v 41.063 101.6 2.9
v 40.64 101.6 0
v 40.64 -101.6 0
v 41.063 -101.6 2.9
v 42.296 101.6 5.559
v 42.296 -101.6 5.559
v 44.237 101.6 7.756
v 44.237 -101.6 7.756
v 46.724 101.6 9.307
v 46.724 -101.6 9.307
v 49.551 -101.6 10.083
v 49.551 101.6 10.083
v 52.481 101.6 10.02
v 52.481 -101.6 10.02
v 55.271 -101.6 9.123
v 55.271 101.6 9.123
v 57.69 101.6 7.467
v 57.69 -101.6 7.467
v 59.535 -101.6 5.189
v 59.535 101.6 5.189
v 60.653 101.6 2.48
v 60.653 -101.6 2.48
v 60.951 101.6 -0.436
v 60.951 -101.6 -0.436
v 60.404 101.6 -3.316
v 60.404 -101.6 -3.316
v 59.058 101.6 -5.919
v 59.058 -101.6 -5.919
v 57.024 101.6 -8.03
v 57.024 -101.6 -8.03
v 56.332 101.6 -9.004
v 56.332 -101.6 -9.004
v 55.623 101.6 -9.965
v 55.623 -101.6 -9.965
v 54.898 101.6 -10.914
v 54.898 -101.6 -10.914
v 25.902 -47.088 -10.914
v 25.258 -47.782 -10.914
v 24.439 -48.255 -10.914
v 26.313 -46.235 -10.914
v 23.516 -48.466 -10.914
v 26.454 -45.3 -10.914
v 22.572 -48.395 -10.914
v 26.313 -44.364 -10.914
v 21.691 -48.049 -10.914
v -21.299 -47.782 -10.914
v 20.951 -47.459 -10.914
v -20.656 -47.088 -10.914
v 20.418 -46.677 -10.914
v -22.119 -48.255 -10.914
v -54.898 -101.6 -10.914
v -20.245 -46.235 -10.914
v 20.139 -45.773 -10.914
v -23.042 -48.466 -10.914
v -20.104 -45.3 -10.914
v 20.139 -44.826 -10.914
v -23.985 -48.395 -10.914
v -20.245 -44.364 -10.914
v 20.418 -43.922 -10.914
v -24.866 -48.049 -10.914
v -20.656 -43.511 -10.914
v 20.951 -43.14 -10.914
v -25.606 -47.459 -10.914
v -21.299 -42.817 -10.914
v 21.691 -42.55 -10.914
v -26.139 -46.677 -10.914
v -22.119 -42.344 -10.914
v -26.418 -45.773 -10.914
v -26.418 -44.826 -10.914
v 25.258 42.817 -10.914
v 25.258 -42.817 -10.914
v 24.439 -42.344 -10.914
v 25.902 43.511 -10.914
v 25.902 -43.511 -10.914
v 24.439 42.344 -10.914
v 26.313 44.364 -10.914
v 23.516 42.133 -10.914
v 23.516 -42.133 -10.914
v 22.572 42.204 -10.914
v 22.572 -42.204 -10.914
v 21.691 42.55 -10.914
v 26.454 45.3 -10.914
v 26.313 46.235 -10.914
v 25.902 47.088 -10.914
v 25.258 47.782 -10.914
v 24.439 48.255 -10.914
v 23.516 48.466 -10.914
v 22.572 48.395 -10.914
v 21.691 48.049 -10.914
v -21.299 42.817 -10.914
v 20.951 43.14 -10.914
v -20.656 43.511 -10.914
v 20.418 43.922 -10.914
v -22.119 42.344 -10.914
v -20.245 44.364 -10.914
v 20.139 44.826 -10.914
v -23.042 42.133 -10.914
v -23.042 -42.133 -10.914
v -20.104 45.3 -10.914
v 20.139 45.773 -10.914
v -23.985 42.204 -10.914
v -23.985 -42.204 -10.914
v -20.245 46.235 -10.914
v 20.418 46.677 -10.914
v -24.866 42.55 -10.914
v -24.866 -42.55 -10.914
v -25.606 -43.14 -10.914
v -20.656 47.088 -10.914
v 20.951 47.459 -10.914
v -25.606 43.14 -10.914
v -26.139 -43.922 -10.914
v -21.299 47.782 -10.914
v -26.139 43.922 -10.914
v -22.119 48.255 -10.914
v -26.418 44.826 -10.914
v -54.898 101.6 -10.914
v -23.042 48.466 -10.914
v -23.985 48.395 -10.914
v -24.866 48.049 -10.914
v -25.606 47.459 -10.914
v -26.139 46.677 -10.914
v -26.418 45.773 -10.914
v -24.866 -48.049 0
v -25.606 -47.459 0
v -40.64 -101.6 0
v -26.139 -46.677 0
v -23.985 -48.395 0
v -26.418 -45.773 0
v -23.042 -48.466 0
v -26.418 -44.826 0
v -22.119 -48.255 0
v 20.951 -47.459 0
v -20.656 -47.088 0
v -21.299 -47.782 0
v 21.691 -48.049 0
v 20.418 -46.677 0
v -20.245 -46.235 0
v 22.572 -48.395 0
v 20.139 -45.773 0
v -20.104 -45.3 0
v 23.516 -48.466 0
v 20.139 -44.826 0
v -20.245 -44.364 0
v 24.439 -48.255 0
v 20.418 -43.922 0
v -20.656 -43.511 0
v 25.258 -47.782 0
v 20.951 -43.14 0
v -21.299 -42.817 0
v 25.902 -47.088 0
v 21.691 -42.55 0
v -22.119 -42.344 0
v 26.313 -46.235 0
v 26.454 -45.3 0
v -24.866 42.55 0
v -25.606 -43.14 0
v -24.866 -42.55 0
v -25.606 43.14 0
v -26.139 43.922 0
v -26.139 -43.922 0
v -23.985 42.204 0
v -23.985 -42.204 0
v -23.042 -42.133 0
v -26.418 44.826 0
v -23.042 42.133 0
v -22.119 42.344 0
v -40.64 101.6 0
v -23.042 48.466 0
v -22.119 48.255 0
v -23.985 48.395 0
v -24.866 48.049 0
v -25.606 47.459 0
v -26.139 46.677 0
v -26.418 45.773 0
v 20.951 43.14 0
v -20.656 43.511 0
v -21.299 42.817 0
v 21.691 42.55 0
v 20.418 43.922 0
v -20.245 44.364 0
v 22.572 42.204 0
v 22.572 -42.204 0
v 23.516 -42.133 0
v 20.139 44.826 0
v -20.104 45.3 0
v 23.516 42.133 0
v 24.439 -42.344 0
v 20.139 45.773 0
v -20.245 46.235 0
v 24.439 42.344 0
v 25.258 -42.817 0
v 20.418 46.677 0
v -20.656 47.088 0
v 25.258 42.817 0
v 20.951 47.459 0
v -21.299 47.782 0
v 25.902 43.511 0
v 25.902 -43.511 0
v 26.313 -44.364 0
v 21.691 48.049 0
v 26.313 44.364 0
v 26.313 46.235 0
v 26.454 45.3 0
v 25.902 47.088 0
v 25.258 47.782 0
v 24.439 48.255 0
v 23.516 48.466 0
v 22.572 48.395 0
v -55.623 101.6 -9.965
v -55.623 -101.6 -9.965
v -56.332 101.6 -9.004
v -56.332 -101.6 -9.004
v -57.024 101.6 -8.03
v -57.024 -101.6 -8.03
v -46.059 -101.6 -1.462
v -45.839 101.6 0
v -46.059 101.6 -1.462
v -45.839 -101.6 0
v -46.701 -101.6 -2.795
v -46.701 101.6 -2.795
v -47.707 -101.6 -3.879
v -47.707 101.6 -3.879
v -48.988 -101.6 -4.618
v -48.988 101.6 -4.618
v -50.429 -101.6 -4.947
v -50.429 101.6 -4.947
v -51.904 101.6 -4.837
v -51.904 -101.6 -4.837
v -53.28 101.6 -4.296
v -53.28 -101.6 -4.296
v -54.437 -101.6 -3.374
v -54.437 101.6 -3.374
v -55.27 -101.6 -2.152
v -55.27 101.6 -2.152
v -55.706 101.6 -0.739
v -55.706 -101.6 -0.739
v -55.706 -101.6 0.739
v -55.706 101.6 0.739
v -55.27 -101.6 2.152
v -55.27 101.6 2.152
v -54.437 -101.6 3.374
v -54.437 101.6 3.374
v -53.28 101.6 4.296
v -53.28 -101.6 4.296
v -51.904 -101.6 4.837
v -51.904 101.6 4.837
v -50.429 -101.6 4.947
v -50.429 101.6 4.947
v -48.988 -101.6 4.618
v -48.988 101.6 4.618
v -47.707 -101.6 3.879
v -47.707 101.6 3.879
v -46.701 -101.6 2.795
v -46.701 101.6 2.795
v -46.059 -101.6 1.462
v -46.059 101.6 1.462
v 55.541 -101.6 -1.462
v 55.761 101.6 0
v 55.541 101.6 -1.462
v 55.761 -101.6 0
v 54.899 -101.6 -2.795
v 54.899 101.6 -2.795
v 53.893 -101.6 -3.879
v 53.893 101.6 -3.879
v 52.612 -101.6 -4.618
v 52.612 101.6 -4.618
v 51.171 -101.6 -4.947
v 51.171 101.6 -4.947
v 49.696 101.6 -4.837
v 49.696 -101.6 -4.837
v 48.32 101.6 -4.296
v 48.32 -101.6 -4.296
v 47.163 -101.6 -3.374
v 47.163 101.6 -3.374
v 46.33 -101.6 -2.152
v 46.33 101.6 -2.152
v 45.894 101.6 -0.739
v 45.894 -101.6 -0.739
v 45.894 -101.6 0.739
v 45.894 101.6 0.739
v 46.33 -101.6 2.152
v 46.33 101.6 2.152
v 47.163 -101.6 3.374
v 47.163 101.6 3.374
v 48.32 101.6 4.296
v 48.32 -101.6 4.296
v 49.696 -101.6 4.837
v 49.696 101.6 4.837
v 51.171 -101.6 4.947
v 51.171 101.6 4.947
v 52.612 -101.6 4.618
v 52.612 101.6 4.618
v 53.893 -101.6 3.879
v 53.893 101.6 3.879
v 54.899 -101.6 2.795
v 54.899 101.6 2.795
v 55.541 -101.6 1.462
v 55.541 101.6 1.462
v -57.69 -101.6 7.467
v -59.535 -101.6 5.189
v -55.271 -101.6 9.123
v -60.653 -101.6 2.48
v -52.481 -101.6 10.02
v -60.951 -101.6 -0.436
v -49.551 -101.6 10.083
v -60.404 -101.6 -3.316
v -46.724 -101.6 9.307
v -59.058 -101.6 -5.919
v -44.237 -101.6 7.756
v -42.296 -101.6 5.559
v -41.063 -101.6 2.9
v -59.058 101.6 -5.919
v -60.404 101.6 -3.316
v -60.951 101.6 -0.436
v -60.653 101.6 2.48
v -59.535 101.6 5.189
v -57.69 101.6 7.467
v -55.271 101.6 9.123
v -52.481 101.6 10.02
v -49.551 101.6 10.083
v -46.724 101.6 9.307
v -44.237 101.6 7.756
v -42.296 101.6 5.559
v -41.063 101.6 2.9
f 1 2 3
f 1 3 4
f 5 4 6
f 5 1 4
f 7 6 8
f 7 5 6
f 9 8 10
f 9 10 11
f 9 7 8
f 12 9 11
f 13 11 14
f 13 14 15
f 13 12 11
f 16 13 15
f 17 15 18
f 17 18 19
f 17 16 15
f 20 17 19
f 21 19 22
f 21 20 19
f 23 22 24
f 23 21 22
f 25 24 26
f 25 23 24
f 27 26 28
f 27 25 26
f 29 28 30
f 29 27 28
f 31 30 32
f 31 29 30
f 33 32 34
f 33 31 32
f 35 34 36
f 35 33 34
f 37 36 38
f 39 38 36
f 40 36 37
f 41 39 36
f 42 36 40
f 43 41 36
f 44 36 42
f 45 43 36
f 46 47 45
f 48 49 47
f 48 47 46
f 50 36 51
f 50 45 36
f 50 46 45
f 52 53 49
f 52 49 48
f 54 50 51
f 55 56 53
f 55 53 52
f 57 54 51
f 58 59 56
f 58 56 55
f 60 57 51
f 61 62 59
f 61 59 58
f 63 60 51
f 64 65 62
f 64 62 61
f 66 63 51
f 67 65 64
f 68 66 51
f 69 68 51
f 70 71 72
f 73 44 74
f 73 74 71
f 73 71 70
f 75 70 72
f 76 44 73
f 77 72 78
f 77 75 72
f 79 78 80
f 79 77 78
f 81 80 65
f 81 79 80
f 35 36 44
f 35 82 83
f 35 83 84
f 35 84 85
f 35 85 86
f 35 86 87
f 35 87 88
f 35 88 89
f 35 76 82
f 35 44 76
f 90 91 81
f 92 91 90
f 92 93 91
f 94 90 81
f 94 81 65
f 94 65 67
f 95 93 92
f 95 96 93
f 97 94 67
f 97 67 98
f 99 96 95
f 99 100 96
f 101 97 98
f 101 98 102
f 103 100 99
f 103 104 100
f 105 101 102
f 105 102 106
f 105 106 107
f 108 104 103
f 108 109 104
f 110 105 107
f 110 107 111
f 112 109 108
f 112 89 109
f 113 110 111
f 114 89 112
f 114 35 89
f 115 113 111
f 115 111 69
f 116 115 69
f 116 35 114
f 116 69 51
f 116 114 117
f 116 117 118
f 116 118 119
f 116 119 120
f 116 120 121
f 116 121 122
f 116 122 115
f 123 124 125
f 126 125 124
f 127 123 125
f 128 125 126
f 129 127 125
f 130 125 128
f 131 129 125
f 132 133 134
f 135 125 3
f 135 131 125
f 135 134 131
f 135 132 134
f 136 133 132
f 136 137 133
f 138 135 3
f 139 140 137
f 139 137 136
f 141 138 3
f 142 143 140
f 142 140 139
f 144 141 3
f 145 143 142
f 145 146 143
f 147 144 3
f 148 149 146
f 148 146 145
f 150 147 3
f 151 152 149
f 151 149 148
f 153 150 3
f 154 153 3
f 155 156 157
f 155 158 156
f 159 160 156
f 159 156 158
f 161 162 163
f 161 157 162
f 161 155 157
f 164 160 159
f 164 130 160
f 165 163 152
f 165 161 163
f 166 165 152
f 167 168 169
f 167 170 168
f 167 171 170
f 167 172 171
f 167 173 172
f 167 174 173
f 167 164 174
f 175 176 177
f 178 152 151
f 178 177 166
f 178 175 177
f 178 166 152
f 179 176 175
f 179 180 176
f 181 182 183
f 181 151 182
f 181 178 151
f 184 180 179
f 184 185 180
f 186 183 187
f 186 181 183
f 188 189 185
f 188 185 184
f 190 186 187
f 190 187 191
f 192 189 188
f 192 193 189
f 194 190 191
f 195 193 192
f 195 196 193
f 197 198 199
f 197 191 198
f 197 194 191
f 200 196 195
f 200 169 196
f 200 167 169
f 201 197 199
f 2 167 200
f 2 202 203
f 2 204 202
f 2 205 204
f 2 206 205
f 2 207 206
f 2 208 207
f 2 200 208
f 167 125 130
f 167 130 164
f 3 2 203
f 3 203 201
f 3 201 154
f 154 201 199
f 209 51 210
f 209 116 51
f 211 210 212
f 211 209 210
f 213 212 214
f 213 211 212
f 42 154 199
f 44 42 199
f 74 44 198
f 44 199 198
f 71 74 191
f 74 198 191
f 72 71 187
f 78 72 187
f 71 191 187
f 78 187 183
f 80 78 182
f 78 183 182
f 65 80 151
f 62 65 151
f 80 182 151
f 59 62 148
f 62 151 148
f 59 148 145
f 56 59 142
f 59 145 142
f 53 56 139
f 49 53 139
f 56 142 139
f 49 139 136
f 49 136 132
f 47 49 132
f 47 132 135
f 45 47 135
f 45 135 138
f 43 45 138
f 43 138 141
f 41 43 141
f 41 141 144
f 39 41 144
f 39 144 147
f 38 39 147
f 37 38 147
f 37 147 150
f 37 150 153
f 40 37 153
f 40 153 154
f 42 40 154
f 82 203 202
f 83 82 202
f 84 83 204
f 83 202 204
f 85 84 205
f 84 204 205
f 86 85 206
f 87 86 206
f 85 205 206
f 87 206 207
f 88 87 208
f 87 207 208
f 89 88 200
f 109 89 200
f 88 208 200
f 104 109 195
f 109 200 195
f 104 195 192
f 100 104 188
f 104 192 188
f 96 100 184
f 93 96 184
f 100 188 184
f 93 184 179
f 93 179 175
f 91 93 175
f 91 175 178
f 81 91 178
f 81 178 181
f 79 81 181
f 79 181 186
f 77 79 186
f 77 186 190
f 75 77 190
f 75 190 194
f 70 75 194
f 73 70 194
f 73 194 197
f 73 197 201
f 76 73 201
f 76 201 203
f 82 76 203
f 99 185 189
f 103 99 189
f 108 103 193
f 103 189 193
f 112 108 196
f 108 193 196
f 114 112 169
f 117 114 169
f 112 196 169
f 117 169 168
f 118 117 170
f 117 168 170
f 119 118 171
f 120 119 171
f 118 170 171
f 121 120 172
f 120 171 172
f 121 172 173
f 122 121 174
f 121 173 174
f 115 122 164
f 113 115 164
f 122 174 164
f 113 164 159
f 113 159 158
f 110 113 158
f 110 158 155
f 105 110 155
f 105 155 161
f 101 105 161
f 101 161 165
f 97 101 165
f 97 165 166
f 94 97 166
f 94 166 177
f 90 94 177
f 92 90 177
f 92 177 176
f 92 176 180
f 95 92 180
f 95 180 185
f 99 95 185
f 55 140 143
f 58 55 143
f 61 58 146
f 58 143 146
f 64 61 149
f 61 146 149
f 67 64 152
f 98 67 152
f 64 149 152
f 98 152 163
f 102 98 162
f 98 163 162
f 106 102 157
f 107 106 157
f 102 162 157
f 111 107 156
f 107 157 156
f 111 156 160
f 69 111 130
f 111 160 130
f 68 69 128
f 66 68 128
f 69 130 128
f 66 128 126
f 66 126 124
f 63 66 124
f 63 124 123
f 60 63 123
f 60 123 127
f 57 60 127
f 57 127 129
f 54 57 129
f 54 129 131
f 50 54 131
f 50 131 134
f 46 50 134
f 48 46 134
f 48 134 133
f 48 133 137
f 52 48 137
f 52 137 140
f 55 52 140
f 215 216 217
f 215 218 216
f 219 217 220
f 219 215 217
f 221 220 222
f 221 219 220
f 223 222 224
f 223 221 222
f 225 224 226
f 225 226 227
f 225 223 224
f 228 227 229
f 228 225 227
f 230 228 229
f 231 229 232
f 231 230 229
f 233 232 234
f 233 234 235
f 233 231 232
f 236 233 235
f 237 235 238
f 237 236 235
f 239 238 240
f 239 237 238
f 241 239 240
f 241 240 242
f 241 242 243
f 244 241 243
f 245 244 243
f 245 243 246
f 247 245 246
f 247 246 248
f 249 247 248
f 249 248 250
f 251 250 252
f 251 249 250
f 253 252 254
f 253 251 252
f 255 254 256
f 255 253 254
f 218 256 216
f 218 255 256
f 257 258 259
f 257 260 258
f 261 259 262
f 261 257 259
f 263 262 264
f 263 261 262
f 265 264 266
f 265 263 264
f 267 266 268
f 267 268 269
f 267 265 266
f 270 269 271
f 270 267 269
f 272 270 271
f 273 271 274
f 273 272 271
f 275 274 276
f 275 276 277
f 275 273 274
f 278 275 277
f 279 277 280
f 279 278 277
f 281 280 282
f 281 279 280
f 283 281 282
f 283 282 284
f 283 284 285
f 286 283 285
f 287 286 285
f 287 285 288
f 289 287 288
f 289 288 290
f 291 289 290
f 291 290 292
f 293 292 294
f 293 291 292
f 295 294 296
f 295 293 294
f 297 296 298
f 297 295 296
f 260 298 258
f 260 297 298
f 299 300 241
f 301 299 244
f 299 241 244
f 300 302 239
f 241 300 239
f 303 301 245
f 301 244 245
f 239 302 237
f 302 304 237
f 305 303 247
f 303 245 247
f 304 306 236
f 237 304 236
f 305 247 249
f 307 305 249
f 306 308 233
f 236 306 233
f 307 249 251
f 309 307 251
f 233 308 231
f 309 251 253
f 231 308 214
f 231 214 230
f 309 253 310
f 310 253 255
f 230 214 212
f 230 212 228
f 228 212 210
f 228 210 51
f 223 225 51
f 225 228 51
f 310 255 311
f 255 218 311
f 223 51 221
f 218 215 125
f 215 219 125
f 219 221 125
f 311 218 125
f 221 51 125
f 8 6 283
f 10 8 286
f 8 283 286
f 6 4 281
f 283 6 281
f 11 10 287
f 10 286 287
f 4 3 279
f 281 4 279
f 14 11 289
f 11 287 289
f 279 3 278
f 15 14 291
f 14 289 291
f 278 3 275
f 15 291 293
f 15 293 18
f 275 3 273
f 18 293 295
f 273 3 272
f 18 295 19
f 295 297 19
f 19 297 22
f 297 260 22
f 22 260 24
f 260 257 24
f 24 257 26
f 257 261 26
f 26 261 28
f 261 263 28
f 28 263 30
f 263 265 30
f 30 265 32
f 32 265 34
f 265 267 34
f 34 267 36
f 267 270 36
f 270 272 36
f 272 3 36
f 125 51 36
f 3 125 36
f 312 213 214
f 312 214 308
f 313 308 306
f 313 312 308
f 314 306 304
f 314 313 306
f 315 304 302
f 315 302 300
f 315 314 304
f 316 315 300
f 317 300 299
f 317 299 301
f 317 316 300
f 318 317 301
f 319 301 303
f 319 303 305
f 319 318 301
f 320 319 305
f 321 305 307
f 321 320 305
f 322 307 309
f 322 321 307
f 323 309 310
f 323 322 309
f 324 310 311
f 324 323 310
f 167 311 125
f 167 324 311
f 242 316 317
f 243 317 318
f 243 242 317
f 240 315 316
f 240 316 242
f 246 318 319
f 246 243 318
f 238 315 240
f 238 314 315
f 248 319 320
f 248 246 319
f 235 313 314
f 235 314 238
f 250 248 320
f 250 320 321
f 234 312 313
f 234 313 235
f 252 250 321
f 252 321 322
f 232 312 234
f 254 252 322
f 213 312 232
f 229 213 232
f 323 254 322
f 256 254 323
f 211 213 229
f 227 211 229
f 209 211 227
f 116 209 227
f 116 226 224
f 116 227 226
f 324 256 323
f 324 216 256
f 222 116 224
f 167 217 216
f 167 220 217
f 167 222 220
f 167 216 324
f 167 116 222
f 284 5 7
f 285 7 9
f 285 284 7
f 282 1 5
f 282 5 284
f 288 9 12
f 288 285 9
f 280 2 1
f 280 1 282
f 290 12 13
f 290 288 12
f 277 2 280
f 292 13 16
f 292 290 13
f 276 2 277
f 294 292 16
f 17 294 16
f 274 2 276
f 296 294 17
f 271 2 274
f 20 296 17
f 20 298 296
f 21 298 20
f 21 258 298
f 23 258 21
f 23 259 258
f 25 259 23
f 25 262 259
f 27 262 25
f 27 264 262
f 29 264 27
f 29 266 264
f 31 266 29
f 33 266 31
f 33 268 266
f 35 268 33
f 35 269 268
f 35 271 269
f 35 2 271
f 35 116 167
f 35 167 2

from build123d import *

# Parameters (mm, degrees)
SKETCH1_R               = 4.9609375
BOSS_EXTRUDE1_DEPTH     = 101.6
SKETCH2_R               = 3.175
CUT_EXTRUDE1_DEPTH      = 11.16
CUT_EXTRUDE1_DEPTH_BACK = 11.914472708


with BuildPart() as part:
    # Sketch1 → Boss-Extrude1 (new body, symmetric)
    with BuildSketch(Plane(origin=(0, 0, 0), x_dir=(1, 0, 0), z_dir=(0, 1, 0))):
        with BuildLine():
            ThreePointArc((-54.898232946, 10.914472708), (-55.979756859, 9.486084273), (-57.024125462, 8.030308975))
            ThreePointArc((-57.024125462, 8.030308975), (-55.271492218, -9.123122127), (-40.64, 0))
            Line((-40.64, 0), (40.64, 0))
            ThreePointArc((40.64, 0), (55.271492218, -9.123122127), (57.024125462, 8.030308975))
            ThreePointArc((57.024125462, 8.030308975), (55.979756859, 9.486084273), (54.898232946, 10.914472708))
            Line((54.898232946, 10.914472708), (-54.898232946, 10.914472708))
        make_face()
        with Locations((-50.8, 0)):
            Circle(SKETCH1_R, mode=Mode.SUBTRACT)
        with Locations((50.8, 0)):
            Circle(SKETCH1_R, mode=Mode.SUBTRACT)
    extrude(amount=BOSS_EXTRUDE1_DEPTH, both=True)

    # Sketch2 → Cut-Extrude1 (cut, two sides)
    with BuildSketch(Plane.XY) as cut_extrude1_sk:
        with Locations((-23.278917925, 45.299515962)):
            Circle(SKETCH2_R)
        with Locations((23.278917925, 45.299515962)):
            Circle(SKETCH2_R)
        with Locations((23.278917925, -45.299515962)):
            Circle(SKETCH2_R)
        with Locations((-23.278917925, -45.299515962)):
            Circle(SKETCH2_R)
    extrude(amount=CUT_EXTRUDE1_DEPTH, mode=Mode.SUBTRACT)
    extrude(cut_extrude1_sk.sketch, amount=-CUT_EXTRUDE1_DEPTH_BACK, mode=Mode.SUBTRACT)


solid = part.part
